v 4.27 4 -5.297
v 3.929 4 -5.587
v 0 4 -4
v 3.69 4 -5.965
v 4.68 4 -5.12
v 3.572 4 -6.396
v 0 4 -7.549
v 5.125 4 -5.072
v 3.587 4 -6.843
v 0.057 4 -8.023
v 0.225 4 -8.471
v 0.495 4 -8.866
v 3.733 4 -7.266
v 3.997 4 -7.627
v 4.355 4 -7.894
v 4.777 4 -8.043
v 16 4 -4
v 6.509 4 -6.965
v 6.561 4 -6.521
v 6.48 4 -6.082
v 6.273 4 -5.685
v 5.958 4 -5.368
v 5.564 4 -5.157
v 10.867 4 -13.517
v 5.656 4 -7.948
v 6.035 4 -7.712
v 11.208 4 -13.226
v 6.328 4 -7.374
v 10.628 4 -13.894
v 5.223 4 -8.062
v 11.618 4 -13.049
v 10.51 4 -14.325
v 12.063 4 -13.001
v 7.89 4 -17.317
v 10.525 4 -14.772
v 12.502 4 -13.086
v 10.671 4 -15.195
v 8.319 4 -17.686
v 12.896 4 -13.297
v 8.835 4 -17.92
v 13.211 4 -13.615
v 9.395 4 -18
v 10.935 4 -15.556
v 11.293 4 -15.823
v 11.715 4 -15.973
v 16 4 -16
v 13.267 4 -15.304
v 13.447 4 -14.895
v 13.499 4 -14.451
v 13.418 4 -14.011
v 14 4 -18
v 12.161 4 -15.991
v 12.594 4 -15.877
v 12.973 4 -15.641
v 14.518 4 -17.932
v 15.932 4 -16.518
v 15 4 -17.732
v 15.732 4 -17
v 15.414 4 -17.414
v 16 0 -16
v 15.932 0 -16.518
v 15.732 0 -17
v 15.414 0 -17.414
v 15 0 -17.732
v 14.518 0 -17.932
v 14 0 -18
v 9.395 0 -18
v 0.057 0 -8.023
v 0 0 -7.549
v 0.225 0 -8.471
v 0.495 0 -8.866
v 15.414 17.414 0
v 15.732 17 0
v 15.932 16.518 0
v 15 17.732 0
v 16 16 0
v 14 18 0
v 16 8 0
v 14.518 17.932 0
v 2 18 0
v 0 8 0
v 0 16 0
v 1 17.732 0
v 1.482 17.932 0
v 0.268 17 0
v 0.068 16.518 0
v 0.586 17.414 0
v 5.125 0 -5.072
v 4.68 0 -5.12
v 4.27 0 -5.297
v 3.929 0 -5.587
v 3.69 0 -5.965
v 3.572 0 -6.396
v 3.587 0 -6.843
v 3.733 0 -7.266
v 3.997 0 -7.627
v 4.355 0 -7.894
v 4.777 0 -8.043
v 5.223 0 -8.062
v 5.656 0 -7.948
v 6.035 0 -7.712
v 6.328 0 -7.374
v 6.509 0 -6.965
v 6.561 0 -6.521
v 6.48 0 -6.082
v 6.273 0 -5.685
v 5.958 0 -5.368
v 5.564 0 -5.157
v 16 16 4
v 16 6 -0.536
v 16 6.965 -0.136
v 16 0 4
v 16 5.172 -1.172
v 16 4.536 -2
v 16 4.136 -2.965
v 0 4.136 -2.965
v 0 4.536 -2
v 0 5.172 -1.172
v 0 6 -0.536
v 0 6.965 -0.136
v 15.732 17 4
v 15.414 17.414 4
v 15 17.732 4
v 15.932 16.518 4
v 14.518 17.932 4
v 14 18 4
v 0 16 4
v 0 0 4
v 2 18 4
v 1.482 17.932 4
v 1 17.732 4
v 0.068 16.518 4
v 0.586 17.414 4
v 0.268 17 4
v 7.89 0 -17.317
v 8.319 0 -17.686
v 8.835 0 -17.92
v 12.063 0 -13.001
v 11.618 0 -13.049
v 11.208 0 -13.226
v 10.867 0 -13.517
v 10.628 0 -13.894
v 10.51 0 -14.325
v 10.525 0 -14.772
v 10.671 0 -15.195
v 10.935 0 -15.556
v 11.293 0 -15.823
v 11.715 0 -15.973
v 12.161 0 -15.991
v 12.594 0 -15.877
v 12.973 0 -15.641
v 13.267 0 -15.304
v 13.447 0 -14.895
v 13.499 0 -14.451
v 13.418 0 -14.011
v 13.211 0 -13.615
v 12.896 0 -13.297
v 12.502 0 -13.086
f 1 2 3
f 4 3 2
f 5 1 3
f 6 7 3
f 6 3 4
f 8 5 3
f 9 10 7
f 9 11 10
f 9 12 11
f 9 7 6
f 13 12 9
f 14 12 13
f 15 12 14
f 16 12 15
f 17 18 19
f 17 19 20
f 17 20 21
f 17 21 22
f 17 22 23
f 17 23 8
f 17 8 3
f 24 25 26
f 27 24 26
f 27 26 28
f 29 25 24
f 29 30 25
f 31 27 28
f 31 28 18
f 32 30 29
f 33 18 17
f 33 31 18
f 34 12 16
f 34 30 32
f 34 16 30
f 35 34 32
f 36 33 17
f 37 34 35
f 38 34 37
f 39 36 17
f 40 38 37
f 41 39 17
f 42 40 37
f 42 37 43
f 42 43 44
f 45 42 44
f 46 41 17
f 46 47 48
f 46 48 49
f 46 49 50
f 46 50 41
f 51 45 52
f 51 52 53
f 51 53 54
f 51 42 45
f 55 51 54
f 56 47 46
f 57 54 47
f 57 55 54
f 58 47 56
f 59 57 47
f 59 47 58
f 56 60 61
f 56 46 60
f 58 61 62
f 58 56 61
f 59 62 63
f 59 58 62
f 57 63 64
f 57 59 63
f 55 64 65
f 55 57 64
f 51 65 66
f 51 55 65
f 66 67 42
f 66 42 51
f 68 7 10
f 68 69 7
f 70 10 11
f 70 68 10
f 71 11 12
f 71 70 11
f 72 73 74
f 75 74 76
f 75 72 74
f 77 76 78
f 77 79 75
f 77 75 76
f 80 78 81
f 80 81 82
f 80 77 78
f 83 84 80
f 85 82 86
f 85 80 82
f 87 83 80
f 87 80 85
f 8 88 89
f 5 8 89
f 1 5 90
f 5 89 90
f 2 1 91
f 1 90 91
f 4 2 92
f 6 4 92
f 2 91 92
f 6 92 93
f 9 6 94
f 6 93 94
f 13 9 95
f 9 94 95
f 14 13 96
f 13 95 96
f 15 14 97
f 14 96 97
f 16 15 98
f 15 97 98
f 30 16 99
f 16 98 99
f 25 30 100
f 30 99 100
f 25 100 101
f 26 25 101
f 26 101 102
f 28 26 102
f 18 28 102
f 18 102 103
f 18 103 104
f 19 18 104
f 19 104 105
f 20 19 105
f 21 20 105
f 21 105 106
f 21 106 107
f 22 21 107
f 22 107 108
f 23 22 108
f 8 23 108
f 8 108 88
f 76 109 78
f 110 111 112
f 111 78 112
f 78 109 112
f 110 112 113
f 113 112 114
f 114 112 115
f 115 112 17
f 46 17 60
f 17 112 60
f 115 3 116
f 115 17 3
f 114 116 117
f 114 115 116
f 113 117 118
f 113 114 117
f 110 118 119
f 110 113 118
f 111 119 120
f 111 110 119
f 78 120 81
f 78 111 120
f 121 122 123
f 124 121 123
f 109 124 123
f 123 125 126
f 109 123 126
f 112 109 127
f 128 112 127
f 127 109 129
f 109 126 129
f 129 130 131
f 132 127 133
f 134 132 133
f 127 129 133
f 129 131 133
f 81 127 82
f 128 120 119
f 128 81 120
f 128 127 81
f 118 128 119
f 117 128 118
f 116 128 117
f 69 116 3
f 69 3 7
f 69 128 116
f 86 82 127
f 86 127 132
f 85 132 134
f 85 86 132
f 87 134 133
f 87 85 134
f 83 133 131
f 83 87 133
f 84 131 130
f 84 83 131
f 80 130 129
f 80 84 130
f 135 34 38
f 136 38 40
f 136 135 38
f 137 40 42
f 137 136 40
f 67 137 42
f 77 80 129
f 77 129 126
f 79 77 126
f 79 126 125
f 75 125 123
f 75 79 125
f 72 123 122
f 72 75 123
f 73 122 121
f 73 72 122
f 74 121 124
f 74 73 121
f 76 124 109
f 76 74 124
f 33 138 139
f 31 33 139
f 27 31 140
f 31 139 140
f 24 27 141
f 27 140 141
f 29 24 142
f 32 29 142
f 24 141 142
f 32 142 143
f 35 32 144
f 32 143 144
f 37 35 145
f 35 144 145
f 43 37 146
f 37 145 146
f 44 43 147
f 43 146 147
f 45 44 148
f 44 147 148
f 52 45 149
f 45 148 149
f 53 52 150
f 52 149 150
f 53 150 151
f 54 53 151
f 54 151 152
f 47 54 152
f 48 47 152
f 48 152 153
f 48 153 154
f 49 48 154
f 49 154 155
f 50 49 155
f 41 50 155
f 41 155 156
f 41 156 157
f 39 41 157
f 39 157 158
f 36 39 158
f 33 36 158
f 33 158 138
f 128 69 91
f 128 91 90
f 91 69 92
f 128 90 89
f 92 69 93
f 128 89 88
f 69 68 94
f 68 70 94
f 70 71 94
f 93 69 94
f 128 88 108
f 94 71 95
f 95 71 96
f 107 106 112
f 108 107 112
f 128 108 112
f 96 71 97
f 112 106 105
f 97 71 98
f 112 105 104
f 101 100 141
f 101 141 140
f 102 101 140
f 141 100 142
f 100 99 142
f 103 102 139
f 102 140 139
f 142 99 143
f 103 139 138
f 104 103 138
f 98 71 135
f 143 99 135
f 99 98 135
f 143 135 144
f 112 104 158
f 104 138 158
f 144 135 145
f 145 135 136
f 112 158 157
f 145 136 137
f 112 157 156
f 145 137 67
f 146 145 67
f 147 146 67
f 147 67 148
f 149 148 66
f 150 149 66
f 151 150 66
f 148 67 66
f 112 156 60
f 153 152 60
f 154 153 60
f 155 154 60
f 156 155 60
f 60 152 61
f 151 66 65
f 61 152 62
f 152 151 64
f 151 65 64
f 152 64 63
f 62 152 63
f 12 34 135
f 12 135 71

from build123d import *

# Parameters (mm, degrees)
BOSS_EXTRUDE1_DEPTH          = 4
SKETCH2_W                    = 16
SKETCH2_H                    = 18
BOSS_EXTRUDE2_DEPTH          = 4
FILLET1_R                    = 4
F_3_0_3_DIAMETER_HOLE1_D     = 3
F_3_0_3_DIAMETER_HOLE1_DEPTH = 30
F_3_0_3_DIAMETER_HOLE1_TIP   = 0.901290929
CUT_EXTRUDE1_DEPTH           = 10
FILLET2_R                    = 2


with BuildPart() as part:
    # Sketch1 → Boss-Extrude1 (new body)
    with BuildSketch(Plane.XY):
        with BuildLine():
            Line((0, 0), (0, 16))
            ThreePointArc((0, 16), (0.585786438, 17.414213562), (2, 18))
            Line((2, 18), (14, 18))
            ThreePointArc((14, 18), (15.414213562, 17.414213562), (16, 16))
            Line((16, 16), (16, 0))
            Line((16, 0), (0, 0))
        make_face()
    extrude(amount=BOSS_EXTRUDE1_DEPTH)

    # Sketch2 → Boss-Extrude2 (add)
    with BuildSketch(Plane(origin=(0, 0, 0), x_dir=(1, 0, 0), z_dir=(0, 1, 0))):
        with Locations((8, 9)):
            Rectangle(SKETCH2_W, SKETCH2_H)
    extrude(amount=BOSS_EXTRUDE2_DEPTH)

    # Fillet1
    fillet1_edges = [part.edges().sort_by_distance(p)[0] for p in [
        (8, 4, 0),
    ]]
    fillet(fillet1_edges, radius=FILLET1_R)

    # Ø3.0 (3) Diameter Hole1
    with Locations(Plane(origin=(939.624698197, 4, -711.338031018), x_dir=(-0.041819335, 0, -0.999125189), z_dir=(0, 1, 0))):
        with Locations((-665.06790374, 963.218082486), (-657.435781521, 955.954504856)):
            Hole(F_3_0_3_DIAMETER_HOLE1_D / 2, depth=F_3_0_3_DIAMETER_HOLE1_DEPTH)
            with Locations((0, 0, -(F_3_0_3_DIAMETER_HOLE1_DEPTH + F_3_0_3_DIAMETER_HOLE1_TIP / 2))):  # 118° drill point
                Cone(0, F_3_0_3_DIAMETER_HOLE1_D / 2, F_3_0_3_DIAMETER_HOLE1_TIP, mode=Mode.SUBTRACT)

    # Sketch6 → Cut-Extrude1 (cut)
    with BuildSketch(Plane(origin=(0, 4, 0), x_dir=(1, 0, 0), z_dir=(0, 1, 0))):
        Polygon((8.487460621, 18), (0, 8.300045005), (0, 18), align=None)
    extrude(amount=-CUT_EXTRUDE1_DEPTH, mode=Mode.SUBTRACT)

    # Fillet2
    fillet2_edges = [part.edges().sort_by_distance(p)[0] for p in [
        (16, 2, -18),
        (0, 2, -8.300045005),
        (8.487460621, 2, -18),
    ]]
    fillet(fillet2_edges, radius=FILLET2_R)


solid = part.part
